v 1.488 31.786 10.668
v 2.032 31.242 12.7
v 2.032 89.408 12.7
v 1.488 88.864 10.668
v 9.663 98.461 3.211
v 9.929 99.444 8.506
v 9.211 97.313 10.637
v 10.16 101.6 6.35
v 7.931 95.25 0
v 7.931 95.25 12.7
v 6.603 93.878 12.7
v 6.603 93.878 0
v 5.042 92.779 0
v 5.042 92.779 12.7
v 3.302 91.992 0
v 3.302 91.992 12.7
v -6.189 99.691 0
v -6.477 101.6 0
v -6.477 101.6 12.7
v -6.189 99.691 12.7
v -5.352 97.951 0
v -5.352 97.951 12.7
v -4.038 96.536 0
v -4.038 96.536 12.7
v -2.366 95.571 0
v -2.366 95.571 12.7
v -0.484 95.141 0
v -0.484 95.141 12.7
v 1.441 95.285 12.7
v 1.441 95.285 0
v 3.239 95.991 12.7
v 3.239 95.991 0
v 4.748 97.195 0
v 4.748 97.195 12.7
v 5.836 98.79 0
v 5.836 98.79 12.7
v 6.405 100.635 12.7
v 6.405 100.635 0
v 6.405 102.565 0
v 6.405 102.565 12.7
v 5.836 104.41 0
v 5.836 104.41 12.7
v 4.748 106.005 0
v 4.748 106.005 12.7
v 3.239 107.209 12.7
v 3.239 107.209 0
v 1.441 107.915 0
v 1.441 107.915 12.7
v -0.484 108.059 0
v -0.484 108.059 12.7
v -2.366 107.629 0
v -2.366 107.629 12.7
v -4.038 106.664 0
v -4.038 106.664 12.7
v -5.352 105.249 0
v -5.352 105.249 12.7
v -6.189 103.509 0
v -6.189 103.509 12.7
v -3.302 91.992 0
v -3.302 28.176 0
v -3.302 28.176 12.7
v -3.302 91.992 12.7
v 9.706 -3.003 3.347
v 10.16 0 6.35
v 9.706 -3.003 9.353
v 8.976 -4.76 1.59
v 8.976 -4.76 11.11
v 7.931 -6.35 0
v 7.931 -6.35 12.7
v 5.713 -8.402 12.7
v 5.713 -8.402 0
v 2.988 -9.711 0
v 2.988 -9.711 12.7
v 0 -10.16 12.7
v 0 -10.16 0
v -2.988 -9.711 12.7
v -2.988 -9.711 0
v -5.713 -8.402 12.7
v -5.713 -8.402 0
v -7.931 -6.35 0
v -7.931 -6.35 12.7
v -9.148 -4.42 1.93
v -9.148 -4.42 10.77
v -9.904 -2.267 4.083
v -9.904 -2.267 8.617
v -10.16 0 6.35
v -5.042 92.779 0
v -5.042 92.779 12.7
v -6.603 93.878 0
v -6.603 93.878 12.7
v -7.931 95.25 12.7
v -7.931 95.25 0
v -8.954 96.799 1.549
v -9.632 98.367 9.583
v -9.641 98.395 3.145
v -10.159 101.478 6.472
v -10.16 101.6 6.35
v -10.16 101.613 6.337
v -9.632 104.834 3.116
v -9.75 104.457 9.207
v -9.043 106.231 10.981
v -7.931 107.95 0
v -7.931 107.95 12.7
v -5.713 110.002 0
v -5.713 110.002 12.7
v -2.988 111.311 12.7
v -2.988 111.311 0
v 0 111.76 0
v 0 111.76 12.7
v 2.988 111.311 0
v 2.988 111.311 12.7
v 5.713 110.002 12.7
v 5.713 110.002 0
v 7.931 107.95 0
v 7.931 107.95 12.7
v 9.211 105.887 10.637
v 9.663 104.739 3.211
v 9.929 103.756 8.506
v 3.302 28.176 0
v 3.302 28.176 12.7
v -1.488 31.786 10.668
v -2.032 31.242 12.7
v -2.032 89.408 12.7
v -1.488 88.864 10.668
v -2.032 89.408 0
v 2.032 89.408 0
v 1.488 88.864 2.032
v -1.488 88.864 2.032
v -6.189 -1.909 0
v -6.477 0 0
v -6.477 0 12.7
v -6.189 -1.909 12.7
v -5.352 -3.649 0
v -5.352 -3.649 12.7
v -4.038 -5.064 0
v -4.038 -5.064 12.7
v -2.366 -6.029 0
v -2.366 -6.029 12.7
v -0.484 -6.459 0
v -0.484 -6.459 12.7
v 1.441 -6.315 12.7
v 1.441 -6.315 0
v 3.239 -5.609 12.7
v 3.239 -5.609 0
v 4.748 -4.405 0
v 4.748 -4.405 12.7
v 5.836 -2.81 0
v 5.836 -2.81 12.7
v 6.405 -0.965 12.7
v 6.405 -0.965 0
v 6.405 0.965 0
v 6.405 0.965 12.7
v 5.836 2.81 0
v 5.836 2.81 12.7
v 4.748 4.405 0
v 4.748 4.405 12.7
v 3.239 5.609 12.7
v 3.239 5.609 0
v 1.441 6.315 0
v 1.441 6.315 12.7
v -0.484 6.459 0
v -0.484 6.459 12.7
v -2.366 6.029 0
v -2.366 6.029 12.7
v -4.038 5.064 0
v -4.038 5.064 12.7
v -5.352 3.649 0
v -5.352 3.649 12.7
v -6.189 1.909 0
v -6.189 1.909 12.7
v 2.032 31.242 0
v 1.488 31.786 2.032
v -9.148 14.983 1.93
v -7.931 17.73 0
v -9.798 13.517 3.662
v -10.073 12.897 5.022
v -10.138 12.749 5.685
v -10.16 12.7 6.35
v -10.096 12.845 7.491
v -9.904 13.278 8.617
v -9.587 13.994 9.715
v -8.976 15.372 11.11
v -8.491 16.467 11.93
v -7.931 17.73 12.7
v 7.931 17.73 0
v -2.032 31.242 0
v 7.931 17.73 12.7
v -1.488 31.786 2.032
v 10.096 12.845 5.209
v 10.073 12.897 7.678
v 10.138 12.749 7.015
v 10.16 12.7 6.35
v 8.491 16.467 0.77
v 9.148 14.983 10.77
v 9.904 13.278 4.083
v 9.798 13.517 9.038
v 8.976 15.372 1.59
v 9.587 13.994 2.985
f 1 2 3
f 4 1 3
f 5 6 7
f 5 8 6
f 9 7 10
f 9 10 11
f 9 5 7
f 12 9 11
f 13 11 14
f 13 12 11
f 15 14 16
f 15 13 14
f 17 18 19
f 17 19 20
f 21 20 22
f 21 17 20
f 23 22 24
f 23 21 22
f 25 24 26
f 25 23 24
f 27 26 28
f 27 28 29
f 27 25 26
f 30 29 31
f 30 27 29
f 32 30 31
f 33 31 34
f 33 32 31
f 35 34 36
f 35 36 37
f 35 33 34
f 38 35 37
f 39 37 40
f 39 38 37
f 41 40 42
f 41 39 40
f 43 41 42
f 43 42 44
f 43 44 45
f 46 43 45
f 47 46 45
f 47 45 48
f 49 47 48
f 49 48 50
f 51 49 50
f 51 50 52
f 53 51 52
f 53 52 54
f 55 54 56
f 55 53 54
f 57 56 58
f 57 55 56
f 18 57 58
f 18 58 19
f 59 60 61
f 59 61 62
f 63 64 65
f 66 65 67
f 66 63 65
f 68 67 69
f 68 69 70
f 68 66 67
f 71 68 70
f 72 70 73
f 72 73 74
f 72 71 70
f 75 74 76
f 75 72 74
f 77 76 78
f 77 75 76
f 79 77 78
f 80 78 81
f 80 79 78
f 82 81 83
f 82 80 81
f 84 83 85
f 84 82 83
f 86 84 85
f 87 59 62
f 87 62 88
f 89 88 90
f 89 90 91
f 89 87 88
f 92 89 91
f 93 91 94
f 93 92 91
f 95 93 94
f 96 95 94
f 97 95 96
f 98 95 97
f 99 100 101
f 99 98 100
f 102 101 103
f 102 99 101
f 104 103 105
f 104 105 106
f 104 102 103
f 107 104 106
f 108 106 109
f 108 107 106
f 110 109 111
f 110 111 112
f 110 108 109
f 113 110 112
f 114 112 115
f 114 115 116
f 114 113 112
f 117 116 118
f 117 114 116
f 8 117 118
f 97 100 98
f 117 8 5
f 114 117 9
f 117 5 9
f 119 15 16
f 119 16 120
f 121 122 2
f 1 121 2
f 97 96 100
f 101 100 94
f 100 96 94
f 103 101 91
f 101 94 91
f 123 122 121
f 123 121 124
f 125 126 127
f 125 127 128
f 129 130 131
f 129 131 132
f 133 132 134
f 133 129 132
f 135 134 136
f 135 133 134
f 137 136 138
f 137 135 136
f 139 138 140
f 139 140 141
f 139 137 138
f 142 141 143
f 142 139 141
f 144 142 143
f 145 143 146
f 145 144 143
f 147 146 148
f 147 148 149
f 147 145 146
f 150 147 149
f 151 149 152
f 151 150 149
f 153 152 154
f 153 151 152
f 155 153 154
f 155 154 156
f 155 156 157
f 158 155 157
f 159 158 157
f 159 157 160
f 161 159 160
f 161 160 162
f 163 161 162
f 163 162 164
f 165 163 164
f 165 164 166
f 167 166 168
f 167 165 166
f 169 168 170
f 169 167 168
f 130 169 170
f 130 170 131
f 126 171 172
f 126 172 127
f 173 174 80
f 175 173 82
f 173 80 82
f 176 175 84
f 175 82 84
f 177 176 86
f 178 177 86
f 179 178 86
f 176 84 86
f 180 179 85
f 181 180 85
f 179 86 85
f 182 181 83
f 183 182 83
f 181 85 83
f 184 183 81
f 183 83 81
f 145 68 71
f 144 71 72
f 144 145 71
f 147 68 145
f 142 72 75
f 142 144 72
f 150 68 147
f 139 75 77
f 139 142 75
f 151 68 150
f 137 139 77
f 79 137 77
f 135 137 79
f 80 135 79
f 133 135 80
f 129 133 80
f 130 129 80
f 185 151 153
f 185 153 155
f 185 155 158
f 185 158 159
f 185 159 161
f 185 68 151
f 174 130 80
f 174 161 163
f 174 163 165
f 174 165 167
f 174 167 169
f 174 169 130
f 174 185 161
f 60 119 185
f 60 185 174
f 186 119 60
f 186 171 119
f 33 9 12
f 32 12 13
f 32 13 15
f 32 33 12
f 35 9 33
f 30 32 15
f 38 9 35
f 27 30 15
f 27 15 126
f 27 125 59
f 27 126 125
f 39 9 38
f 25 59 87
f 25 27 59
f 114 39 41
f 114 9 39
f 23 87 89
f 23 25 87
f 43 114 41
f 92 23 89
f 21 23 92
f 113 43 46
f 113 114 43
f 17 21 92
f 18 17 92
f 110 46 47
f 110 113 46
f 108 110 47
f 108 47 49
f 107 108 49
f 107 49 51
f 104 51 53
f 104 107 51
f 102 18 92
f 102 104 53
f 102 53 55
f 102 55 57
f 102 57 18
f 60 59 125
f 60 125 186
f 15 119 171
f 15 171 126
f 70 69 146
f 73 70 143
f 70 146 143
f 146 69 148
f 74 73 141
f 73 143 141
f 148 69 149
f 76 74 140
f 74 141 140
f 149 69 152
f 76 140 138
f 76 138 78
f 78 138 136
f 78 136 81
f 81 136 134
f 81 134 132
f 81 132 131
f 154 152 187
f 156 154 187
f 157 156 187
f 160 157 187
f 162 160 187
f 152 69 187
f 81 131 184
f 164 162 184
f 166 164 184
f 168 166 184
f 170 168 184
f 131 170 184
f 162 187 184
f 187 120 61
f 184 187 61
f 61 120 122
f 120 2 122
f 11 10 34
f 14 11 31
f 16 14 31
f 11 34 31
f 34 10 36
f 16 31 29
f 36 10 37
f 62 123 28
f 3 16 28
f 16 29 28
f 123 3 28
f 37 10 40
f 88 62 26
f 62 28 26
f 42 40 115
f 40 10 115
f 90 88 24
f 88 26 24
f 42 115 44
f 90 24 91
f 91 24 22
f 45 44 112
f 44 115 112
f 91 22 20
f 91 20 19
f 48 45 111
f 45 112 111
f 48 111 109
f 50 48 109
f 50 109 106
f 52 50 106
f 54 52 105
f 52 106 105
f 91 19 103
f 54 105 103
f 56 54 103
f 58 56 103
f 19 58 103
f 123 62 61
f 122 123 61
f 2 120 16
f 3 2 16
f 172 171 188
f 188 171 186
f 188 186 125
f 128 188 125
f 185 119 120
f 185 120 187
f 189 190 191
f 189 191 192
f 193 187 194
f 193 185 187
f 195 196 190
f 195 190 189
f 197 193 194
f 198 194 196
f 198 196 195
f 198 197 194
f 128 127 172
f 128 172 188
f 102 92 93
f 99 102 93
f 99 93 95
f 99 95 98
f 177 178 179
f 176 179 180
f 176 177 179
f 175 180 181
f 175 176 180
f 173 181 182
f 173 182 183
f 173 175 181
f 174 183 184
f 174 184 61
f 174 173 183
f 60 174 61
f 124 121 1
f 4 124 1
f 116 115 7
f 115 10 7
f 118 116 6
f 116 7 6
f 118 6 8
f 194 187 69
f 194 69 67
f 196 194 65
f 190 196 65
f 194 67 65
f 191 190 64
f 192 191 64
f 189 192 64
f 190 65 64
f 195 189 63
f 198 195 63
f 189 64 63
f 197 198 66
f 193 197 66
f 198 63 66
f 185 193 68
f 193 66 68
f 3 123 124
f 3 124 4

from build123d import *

# Parameters (mm, degrees)
SKETCH1_R               = 6.477
BOSS_EXTRUDE1_DEPTH     = 12.7
SKETCH2_W               = 4.064
SKETCH2_H               = 58.166
CUT_EXTRUDE1_DEPTH      = 2.032
CUT_EXTRUDE1_DRAFT      = -15
SKETCH3_W               = 4.064
SKETCH3_H               = 58.166
CUT_EXTRUDE2_DEPTH      = 2.032
CUT_EXTRUDE2_DRAFT      = -15
CUT_EXTRUDE3_DEPTH      = 113.937209103
CUT_EXTRUDE3_DEPTH_BACK = 10.16
SKETCH4_OUTSIDE_W       = 47.17
SKETCH4_OUTSIDE_H       = 39.55
SKETCH4_OUTSIDE_R       = 10.16


with BuildPart() as part:
    # Sketch1 → Boss-Extrude1 (new body)
    with BuildSketch(Plane.XY):
        with BuildLine():
            Line((-10.16, 0), (-10.16, 12.7))
            Line((-10.16, 12.7), (-3.302, 28.175956627))
            Line((-3.302, 28.175956627), (-3.302, 91.991545598))
            ThreePointArc((-3.302, 91.991545598), (0, 111.76), (3.302, 91.991545598))
            Line((3.302, 91.991545598), (3.302, 28.175956627))
            Line((3.302, 28.175956627), (10.16, 12.7))
            Line((10.16, 12.7), (10.16, 0))
            ThreePointArc((10.16, 0), (0, -10.16), (-10.16, 0))
        make_face()
        with Locations(Location((0, 0, 0), (0, 0, 180))):
            Circle(SKETCH1_R, mode=Mode.SUBTRACT)
        with Locations(Location((0, 101.6, 0), (0, 0, 180))):
            Circle(SKETCH1_R, mode=Mode.SUBTRACT)
    extrude(amount=BOSS_EXTRUDE1_DEPTH)


with BuildPart() as cut_extrude1_tool:
    # Sketch2 → Cut-Extrude1 (with draft: the straight prism first)
    with BuildSketch(Plane.XY.offset(12.7)):
        with Locations((0, 60.325)):
            Rectangle(SKETCH2_W, SKETCH2_H)
    extrude(amount=-CUT_EXTRUDE1_DEPTH)
    # Cut-Extrude1: the draft: its side faces are tilted about the plane it starts from
    cut_extrude1_sides = [cut_extrude1_tool.faces().sort_by_distance(p)[0] for p in [
        (-2.032, 60.325, 11.684),
        (0, 31.242, 11.684),
        (2.032, 60.325, 11.684),
        (0, 89.408, 11.684),
    ]]
    draft(cut_extrude1_sides, Plane.XY.offset(12.7), CUT_EXTRUDE1_DRAFT)


with BuildPart() as part_1:
    add(part.part)

    # Cut-Extrude1: cut by cut_extrude1_tool
    add(cut_extrude1_tool.part, mode=Mode.SUBTRACT)


with BuildPart() as cut_extrude2_tool:
    # Sketch3 → Cut-Extrude2 (with draft: the straight prism first)
    with BuildSketch(Plane(origin=(0, 0, 0), x_dir=(-1, 0, 0), z_dir=(0, 0, -1))):
        with Locations((0, 60.325)):
            Rectangle(SKETCH3_W, SKETCH3_H)
    extrude(amount=-CUT_EXTRUDE2_DEPTH)
    # Cut-Extrude2: the draft: its side faces are tilted about the plane it starts from
    cut_extrude2_sides = [cut_extrude2_tool.faces().sort_by_distance(p)[0] for p in [
        (2.032, 60.325, 1.016),
        (0, 31.242, 1.016),
        (-2.032, 60.325, 1.016),
        (0, 89.408, 1.016),
    ]]
    draft(cut_extrude2_sides, Plane(origin=(0, 0, 0), x_dir=(-1, 0, 0), z_dir=(0, 0, -1)), CUT_EXTRUDE2_DRAFT)


with BuildPart() as part_2:
    add(part_1.part)

    # Cut-Extrude2: cut by cut_extrude2_tool
    add(cut_extrude2_tool.part, mode=Mode.SUBTRACT)

    # Sketch4 outside → Cut-Extrude3 (cut, two sides: drawn at the far end of the back side and taken through both)
    with BuildSketch(Plane(origin=(0, 0, 0), x_dir=(1, 0, 0), z_dir=(0, 1, 0)).offset(-CUT_EXTRUDE3_DEPTH_BACK)):
        with Locations((0, -6.35)):
            Rectangle(SKETCH4_OUTSIDE_W, SKETCH4_OUTSIDE_H)
        with Locations((0, -6.35)):
            Circle(SKETCH4_OUTSIDE_R, mode=Mode.SUBTRACT)
    extrude(amount=CUT_EXTRUDE3_DEPTH + CUT_EXTRUDE3_DEPTH_BACK, mode=Mode.SUBTRACT)


solid = part_2.part
